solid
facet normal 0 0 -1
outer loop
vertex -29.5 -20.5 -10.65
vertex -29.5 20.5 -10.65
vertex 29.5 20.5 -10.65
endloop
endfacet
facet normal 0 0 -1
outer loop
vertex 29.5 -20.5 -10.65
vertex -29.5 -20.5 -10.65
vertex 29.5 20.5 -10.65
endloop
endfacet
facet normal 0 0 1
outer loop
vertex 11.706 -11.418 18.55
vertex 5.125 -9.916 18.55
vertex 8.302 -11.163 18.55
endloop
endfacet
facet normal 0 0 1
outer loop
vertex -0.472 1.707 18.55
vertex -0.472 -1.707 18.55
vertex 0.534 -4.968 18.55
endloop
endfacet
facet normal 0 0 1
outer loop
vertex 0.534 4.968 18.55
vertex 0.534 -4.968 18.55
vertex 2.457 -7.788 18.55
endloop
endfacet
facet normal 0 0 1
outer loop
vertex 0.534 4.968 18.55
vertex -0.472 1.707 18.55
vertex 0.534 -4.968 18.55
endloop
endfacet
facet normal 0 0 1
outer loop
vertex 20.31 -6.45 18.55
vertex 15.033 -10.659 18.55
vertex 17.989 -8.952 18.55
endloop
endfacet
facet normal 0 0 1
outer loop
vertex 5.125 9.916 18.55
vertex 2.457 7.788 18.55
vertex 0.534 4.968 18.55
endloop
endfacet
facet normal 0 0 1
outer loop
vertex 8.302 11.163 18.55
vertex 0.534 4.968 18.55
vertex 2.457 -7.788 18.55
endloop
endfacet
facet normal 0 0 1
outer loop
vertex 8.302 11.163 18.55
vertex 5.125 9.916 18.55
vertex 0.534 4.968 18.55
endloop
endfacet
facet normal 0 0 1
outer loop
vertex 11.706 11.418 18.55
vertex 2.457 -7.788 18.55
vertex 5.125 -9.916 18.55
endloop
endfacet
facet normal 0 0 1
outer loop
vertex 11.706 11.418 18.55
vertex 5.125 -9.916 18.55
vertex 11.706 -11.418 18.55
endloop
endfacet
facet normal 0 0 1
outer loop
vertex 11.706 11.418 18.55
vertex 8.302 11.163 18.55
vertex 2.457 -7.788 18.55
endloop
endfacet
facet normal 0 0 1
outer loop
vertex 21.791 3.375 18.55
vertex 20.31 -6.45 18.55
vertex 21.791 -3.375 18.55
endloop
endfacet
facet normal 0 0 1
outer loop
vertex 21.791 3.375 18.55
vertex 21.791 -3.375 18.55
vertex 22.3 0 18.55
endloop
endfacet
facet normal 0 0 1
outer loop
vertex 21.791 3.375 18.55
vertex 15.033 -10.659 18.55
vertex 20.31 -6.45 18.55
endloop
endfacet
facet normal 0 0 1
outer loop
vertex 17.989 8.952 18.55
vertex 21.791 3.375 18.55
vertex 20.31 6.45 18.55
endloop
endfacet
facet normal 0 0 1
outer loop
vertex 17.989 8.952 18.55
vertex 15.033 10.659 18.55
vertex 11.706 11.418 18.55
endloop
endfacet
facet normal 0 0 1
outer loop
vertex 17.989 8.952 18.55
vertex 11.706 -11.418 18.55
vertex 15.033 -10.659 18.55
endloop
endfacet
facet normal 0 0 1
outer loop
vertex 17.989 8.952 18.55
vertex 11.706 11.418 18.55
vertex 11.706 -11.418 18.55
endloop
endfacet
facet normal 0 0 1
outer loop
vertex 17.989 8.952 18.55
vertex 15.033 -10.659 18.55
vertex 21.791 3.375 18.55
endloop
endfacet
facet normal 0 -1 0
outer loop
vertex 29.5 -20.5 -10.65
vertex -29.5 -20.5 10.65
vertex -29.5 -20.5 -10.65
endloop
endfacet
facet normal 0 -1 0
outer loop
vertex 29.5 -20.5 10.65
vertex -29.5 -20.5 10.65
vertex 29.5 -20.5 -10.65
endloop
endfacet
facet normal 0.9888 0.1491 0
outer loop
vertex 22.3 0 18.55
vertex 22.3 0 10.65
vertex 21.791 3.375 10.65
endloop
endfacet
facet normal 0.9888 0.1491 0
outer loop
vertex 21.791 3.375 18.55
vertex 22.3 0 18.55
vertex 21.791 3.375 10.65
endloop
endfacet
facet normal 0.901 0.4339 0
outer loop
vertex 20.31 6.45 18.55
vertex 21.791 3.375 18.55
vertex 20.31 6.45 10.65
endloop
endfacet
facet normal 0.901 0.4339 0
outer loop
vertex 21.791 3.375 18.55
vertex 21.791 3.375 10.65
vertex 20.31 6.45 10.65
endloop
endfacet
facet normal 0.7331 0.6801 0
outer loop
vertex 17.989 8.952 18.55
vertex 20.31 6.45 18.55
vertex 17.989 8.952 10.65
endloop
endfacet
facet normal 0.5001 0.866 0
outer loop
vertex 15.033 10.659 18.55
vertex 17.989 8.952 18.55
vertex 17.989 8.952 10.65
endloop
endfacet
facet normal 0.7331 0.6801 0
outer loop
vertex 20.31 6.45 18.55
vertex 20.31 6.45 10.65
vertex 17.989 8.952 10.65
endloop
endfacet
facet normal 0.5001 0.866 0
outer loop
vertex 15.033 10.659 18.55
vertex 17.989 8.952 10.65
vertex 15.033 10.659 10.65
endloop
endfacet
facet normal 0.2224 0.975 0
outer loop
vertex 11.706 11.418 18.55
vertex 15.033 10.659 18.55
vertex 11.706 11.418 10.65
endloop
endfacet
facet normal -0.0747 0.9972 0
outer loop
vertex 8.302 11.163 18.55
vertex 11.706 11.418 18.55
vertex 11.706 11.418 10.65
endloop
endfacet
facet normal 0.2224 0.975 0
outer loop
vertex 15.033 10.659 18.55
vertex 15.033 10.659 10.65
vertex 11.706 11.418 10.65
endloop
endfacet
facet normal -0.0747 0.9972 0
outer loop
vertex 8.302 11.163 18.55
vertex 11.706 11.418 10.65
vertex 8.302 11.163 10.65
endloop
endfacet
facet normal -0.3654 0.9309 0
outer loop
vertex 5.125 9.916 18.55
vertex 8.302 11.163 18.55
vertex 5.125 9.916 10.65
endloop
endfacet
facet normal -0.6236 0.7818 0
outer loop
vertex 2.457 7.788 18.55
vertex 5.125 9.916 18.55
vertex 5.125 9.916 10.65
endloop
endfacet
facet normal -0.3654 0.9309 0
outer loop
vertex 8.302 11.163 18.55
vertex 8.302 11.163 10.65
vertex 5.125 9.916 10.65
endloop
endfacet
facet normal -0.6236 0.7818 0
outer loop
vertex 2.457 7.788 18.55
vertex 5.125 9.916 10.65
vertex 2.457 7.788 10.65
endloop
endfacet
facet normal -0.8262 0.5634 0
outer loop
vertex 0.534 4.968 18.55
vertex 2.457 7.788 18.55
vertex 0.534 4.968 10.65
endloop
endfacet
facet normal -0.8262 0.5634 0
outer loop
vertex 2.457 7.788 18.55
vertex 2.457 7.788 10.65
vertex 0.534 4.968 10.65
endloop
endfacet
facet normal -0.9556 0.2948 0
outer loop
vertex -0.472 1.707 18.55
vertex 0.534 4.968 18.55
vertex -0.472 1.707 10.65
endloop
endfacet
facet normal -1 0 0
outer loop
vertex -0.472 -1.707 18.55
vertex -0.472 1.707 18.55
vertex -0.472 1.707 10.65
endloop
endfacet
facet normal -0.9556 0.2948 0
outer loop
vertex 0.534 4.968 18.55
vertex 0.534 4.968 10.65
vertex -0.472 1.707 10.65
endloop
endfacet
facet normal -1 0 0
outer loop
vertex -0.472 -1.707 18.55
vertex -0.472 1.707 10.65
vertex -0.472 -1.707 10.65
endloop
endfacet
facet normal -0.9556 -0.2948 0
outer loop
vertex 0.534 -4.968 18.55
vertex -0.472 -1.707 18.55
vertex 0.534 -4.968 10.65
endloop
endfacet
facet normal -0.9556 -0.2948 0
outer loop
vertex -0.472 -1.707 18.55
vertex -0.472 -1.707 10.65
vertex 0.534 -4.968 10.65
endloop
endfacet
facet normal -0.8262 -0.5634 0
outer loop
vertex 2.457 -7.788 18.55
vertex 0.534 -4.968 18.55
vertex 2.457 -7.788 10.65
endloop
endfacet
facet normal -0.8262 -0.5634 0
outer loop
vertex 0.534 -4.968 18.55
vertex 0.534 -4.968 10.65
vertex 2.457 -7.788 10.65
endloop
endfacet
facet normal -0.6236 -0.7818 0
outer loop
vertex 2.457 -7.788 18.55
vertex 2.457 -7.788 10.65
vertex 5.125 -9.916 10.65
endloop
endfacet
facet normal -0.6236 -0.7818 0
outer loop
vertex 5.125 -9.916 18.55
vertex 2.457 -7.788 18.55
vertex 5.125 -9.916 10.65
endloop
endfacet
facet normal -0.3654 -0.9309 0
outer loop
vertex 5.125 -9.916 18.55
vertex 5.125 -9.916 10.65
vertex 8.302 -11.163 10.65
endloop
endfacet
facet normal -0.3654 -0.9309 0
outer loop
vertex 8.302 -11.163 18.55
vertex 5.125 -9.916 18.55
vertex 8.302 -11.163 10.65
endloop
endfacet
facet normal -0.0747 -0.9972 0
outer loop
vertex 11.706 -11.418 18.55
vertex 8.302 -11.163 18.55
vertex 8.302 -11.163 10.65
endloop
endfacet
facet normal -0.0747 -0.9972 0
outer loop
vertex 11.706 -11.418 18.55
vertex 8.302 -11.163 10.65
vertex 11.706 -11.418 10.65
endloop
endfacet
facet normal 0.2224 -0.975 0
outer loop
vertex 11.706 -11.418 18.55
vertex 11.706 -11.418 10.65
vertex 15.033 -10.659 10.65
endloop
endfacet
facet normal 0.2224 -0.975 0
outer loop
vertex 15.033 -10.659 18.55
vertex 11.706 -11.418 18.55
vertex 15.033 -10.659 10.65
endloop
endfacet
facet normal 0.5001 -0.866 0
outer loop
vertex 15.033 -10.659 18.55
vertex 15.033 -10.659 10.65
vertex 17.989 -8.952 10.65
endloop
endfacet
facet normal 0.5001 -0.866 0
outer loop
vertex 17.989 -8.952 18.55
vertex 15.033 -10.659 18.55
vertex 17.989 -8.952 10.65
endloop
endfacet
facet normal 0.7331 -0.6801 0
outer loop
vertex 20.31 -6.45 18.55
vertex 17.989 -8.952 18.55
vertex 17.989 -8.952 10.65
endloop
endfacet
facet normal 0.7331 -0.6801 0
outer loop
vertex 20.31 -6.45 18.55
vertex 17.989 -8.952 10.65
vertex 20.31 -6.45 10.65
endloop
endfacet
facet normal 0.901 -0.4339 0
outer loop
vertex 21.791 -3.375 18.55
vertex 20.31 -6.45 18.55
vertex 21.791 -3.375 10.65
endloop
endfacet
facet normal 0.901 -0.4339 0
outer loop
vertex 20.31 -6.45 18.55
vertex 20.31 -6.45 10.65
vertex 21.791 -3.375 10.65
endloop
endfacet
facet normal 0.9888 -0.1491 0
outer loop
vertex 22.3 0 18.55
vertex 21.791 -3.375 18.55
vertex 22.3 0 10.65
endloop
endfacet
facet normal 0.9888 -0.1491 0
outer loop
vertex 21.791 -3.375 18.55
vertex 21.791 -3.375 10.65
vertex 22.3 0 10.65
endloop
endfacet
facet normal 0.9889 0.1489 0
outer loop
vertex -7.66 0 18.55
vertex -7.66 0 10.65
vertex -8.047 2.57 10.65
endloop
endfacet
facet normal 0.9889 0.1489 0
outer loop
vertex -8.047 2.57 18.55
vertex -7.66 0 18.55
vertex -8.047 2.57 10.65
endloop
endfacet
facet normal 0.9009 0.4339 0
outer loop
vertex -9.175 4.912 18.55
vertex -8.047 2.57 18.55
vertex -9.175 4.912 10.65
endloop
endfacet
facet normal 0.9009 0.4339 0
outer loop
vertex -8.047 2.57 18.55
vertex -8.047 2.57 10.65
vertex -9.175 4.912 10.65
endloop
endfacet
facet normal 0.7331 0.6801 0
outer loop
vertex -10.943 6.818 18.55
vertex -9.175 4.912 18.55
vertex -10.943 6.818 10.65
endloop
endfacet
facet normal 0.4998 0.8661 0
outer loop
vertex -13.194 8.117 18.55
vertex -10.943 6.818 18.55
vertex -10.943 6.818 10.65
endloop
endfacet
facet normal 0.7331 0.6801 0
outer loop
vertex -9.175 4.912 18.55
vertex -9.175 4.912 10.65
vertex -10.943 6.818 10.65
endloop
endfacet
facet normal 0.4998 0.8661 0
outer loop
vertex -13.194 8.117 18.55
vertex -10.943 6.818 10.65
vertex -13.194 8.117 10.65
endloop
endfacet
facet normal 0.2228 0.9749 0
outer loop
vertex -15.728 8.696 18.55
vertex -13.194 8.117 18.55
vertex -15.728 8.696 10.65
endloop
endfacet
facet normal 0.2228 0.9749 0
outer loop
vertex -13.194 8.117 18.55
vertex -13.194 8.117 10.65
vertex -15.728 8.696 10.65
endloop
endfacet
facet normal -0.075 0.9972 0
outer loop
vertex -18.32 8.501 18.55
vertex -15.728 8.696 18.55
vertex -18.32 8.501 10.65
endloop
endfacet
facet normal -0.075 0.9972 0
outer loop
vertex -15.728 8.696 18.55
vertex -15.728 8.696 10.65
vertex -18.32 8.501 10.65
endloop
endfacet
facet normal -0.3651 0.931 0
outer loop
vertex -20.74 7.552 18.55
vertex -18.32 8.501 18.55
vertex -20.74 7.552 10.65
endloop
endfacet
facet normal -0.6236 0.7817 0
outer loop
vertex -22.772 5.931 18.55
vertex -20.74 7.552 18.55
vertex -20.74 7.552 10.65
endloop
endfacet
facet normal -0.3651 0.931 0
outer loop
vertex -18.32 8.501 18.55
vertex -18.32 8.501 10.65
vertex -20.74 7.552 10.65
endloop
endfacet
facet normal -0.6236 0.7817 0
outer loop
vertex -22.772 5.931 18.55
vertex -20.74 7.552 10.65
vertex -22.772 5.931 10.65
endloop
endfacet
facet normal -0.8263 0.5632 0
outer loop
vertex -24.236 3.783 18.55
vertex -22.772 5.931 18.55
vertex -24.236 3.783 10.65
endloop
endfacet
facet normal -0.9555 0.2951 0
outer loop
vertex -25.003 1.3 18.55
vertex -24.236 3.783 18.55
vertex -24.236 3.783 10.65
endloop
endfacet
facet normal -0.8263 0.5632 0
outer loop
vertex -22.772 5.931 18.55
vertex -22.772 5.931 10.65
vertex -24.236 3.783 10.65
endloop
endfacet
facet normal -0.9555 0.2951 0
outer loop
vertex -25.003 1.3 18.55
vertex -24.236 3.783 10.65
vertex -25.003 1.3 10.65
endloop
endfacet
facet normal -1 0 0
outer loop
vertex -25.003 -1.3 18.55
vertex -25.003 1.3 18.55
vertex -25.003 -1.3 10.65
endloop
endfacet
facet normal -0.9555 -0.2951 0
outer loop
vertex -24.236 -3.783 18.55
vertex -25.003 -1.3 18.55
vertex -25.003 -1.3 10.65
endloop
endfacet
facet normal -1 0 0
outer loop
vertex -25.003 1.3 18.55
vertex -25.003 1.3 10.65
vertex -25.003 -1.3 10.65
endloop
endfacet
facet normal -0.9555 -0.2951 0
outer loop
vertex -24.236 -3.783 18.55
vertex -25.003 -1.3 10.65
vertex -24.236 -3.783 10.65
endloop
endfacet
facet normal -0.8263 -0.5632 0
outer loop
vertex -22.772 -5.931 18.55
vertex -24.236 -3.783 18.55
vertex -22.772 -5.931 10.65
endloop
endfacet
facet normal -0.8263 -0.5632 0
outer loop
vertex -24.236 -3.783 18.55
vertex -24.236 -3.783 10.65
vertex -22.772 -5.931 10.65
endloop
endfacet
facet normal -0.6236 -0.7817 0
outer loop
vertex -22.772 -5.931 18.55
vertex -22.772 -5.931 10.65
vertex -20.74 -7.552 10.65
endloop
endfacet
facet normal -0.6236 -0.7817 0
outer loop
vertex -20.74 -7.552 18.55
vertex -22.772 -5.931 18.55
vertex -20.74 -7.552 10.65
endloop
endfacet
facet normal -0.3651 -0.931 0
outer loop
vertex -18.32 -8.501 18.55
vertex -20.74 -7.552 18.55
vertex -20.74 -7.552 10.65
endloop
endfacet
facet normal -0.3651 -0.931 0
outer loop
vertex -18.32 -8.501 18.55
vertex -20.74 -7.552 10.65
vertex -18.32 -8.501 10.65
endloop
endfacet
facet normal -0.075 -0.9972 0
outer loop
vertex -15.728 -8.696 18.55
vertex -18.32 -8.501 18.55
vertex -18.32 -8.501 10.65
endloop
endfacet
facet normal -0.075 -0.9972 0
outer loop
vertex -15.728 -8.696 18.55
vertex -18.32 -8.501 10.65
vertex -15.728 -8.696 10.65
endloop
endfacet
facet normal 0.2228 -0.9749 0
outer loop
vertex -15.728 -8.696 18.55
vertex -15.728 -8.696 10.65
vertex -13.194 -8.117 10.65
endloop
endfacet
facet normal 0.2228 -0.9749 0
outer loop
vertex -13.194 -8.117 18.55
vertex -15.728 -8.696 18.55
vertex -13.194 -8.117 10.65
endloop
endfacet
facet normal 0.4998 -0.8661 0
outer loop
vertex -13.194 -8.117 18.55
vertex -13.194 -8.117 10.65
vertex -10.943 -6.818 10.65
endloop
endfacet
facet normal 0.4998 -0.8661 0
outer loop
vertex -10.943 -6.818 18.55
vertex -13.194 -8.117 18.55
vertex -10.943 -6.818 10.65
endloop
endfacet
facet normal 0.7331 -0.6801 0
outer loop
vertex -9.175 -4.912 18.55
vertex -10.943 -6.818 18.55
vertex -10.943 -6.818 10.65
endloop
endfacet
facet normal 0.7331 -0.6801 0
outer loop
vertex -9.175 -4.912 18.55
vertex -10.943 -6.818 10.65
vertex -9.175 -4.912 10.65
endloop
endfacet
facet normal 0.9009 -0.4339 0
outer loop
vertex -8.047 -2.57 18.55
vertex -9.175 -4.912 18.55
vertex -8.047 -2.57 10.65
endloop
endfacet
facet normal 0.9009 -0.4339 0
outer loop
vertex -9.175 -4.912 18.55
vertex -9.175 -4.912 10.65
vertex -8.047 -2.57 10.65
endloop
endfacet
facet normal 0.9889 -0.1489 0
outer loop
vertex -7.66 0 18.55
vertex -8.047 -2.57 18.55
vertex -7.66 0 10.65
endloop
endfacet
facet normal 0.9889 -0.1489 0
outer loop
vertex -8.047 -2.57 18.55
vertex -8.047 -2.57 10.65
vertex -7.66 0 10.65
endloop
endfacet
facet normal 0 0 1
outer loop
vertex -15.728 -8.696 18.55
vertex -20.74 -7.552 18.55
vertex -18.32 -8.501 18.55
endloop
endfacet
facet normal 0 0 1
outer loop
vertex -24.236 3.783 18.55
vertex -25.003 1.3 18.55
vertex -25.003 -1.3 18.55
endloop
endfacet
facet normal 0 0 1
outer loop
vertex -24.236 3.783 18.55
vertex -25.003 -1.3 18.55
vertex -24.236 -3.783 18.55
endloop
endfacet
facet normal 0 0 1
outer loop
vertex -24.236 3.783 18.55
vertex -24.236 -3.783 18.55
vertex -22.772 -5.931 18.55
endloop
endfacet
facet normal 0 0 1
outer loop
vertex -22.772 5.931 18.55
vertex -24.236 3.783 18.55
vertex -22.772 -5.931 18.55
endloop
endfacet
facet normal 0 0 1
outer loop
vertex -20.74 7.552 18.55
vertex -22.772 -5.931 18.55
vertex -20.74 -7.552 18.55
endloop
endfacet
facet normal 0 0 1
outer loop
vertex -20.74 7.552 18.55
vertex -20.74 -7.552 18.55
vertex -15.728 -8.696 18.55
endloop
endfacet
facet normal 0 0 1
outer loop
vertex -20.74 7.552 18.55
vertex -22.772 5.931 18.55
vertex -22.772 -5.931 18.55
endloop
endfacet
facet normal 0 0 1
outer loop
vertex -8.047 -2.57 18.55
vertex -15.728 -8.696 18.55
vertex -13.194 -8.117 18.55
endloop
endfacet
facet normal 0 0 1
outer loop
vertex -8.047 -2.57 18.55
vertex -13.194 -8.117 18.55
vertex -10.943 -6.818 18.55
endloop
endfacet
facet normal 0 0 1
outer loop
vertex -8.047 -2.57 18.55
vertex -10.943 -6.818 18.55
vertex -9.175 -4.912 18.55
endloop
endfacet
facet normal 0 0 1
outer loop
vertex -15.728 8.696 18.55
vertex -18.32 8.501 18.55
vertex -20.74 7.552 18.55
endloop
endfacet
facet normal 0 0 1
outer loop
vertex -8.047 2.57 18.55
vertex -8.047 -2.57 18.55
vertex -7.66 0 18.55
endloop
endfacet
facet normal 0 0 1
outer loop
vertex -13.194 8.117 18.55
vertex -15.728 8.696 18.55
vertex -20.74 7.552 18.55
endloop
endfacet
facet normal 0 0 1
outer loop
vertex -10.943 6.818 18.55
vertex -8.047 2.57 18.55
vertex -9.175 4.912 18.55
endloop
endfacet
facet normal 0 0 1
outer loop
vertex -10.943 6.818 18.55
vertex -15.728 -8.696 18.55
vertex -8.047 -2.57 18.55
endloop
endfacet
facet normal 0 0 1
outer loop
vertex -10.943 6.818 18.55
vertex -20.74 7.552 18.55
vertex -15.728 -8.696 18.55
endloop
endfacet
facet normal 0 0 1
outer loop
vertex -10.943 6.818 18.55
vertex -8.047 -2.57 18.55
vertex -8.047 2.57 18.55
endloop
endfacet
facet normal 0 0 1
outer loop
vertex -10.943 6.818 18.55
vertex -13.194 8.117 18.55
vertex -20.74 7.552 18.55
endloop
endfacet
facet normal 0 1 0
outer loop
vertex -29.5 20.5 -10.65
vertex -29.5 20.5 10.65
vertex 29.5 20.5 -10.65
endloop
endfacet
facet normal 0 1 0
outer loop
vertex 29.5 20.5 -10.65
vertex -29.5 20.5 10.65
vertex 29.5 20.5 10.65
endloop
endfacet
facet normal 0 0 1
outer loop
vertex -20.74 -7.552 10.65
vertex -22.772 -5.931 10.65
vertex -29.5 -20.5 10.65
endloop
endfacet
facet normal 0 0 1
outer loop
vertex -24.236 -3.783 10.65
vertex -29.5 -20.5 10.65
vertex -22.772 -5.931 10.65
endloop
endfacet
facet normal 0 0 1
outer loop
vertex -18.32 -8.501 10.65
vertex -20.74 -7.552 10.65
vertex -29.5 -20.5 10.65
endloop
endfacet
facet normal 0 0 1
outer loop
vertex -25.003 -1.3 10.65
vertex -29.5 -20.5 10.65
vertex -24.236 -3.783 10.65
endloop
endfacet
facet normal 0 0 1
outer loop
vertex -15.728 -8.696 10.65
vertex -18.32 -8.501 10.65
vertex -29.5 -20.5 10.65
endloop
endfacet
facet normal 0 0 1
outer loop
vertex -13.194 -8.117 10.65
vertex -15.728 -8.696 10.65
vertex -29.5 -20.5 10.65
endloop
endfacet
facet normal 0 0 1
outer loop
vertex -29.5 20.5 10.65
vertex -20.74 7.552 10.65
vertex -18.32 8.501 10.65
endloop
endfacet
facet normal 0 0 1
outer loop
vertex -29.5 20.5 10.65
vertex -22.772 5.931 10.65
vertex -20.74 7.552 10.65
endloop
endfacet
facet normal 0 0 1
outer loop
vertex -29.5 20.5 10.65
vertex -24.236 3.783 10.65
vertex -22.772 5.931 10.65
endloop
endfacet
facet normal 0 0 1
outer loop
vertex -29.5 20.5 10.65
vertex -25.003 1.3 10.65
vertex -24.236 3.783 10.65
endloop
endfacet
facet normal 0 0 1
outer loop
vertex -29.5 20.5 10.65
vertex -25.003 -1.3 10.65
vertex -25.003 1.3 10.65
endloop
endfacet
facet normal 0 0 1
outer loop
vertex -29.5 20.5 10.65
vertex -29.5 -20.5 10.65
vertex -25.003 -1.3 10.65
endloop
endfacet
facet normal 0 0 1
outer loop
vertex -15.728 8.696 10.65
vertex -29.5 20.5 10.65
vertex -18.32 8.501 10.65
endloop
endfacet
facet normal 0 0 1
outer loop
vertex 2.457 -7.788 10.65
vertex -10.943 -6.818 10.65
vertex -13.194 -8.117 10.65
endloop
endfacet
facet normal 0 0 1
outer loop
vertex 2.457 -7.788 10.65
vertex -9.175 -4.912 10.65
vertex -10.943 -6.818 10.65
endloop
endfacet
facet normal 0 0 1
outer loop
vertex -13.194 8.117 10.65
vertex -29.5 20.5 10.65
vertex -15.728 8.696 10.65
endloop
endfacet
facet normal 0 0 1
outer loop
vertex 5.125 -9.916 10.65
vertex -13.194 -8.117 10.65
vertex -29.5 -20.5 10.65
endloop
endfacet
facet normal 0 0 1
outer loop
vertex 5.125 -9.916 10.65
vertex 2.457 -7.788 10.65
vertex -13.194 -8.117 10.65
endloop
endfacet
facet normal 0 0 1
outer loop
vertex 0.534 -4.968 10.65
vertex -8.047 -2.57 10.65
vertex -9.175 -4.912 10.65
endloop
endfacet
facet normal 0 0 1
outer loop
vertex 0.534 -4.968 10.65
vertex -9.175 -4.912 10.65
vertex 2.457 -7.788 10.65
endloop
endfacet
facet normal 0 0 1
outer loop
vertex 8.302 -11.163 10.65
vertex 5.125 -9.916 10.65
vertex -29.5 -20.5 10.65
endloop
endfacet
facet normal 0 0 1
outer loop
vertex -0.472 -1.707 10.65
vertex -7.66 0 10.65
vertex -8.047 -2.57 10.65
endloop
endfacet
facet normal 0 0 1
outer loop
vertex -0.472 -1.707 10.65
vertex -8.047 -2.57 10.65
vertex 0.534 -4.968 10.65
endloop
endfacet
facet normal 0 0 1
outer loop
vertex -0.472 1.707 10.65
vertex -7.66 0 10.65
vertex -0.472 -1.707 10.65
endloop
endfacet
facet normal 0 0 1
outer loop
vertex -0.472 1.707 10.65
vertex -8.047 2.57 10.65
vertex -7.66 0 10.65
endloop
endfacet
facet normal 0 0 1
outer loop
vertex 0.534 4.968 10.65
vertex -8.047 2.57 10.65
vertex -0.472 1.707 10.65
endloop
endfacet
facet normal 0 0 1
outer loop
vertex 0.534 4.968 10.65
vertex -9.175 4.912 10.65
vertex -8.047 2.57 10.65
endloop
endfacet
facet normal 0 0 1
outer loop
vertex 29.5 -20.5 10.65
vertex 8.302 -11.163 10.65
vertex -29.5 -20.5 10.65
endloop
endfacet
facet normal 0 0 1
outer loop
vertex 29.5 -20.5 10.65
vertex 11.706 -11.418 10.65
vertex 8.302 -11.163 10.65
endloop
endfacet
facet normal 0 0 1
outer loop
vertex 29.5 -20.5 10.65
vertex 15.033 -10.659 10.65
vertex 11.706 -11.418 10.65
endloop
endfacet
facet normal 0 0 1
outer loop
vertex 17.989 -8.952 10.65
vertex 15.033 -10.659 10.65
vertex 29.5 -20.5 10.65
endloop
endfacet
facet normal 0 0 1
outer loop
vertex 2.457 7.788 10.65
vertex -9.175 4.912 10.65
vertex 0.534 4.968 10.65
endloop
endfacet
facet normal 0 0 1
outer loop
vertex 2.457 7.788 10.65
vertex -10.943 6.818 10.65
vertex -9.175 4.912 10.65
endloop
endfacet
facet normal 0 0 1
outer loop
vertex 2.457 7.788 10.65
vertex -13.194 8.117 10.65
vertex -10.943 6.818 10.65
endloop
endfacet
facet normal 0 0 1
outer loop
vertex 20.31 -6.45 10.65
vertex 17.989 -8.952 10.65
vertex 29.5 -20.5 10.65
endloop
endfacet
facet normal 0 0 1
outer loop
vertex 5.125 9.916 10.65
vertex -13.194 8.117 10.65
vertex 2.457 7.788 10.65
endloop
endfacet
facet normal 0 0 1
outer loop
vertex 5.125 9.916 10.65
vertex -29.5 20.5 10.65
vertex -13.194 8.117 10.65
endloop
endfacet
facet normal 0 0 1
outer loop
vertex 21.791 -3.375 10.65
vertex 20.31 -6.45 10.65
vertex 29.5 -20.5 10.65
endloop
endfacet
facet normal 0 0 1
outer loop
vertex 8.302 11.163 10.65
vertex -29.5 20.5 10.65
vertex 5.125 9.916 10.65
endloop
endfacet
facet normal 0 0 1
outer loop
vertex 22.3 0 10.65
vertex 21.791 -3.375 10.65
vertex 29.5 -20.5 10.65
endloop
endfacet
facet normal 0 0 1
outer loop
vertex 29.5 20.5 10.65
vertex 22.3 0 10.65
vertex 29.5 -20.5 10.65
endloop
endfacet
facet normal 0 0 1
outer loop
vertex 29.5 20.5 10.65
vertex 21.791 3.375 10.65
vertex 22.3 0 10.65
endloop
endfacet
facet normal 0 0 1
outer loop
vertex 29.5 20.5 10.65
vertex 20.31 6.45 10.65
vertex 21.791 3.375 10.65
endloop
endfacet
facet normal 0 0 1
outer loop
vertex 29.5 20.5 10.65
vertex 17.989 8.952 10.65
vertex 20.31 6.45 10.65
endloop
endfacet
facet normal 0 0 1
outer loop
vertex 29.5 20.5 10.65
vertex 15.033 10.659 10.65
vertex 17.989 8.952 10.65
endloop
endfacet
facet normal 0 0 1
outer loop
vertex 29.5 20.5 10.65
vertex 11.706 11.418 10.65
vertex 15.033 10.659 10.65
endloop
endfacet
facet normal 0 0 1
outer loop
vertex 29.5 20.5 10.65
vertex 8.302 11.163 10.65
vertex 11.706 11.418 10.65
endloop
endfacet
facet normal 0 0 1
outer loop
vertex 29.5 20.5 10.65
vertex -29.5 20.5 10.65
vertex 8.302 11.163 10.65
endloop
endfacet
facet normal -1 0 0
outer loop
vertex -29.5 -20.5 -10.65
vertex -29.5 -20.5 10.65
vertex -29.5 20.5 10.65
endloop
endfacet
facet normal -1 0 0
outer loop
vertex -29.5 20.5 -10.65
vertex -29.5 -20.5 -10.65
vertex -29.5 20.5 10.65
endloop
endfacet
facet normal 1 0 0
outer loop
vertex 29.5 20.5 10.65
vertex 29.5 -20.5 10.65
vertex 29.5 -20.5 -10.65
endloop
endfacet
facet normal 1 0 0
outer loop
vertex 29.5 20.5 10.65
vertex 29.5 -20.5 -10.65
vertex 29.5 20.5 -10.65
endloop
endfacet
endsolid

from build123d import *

# Parameters (mm, degrees)
ESBO_O1_W                = 59
ESBO_O1_H                = 41
RESSALTO_EXTRUS_O1_DEPTH = 10.65
ESBO_O2_R                = 11.45
ESBO_O2_R_2              = 8.72
RESSALTO_EXTRUS_O2_DEPTH = 7.9


with BuildPart() as part:
    # Esboço1 → Ressalto-extrusão1 (new, symmetric)
    with BuildSketch(Plane.XY):
        Rectangle(ESBO_O1_W, ESBO_O1_H)
    extrude(amount=RESSALTO_EXTRUS_O1_DEPTH, both=True)

    # Esboço2 → Ressalto-extrusão2 (add)
    with BuildSketch(Plane.XY.offset(10.65)):
        with Locations((10.85, 0)):
            Circle(ESBO_O2_R)
        with Locations((-16.38, 0)):
            Circle(ESBO_O2_R_2)
    extrude(amount=RESSALTO_EXTRUS_O2_DEPTH)


solid = part.part
